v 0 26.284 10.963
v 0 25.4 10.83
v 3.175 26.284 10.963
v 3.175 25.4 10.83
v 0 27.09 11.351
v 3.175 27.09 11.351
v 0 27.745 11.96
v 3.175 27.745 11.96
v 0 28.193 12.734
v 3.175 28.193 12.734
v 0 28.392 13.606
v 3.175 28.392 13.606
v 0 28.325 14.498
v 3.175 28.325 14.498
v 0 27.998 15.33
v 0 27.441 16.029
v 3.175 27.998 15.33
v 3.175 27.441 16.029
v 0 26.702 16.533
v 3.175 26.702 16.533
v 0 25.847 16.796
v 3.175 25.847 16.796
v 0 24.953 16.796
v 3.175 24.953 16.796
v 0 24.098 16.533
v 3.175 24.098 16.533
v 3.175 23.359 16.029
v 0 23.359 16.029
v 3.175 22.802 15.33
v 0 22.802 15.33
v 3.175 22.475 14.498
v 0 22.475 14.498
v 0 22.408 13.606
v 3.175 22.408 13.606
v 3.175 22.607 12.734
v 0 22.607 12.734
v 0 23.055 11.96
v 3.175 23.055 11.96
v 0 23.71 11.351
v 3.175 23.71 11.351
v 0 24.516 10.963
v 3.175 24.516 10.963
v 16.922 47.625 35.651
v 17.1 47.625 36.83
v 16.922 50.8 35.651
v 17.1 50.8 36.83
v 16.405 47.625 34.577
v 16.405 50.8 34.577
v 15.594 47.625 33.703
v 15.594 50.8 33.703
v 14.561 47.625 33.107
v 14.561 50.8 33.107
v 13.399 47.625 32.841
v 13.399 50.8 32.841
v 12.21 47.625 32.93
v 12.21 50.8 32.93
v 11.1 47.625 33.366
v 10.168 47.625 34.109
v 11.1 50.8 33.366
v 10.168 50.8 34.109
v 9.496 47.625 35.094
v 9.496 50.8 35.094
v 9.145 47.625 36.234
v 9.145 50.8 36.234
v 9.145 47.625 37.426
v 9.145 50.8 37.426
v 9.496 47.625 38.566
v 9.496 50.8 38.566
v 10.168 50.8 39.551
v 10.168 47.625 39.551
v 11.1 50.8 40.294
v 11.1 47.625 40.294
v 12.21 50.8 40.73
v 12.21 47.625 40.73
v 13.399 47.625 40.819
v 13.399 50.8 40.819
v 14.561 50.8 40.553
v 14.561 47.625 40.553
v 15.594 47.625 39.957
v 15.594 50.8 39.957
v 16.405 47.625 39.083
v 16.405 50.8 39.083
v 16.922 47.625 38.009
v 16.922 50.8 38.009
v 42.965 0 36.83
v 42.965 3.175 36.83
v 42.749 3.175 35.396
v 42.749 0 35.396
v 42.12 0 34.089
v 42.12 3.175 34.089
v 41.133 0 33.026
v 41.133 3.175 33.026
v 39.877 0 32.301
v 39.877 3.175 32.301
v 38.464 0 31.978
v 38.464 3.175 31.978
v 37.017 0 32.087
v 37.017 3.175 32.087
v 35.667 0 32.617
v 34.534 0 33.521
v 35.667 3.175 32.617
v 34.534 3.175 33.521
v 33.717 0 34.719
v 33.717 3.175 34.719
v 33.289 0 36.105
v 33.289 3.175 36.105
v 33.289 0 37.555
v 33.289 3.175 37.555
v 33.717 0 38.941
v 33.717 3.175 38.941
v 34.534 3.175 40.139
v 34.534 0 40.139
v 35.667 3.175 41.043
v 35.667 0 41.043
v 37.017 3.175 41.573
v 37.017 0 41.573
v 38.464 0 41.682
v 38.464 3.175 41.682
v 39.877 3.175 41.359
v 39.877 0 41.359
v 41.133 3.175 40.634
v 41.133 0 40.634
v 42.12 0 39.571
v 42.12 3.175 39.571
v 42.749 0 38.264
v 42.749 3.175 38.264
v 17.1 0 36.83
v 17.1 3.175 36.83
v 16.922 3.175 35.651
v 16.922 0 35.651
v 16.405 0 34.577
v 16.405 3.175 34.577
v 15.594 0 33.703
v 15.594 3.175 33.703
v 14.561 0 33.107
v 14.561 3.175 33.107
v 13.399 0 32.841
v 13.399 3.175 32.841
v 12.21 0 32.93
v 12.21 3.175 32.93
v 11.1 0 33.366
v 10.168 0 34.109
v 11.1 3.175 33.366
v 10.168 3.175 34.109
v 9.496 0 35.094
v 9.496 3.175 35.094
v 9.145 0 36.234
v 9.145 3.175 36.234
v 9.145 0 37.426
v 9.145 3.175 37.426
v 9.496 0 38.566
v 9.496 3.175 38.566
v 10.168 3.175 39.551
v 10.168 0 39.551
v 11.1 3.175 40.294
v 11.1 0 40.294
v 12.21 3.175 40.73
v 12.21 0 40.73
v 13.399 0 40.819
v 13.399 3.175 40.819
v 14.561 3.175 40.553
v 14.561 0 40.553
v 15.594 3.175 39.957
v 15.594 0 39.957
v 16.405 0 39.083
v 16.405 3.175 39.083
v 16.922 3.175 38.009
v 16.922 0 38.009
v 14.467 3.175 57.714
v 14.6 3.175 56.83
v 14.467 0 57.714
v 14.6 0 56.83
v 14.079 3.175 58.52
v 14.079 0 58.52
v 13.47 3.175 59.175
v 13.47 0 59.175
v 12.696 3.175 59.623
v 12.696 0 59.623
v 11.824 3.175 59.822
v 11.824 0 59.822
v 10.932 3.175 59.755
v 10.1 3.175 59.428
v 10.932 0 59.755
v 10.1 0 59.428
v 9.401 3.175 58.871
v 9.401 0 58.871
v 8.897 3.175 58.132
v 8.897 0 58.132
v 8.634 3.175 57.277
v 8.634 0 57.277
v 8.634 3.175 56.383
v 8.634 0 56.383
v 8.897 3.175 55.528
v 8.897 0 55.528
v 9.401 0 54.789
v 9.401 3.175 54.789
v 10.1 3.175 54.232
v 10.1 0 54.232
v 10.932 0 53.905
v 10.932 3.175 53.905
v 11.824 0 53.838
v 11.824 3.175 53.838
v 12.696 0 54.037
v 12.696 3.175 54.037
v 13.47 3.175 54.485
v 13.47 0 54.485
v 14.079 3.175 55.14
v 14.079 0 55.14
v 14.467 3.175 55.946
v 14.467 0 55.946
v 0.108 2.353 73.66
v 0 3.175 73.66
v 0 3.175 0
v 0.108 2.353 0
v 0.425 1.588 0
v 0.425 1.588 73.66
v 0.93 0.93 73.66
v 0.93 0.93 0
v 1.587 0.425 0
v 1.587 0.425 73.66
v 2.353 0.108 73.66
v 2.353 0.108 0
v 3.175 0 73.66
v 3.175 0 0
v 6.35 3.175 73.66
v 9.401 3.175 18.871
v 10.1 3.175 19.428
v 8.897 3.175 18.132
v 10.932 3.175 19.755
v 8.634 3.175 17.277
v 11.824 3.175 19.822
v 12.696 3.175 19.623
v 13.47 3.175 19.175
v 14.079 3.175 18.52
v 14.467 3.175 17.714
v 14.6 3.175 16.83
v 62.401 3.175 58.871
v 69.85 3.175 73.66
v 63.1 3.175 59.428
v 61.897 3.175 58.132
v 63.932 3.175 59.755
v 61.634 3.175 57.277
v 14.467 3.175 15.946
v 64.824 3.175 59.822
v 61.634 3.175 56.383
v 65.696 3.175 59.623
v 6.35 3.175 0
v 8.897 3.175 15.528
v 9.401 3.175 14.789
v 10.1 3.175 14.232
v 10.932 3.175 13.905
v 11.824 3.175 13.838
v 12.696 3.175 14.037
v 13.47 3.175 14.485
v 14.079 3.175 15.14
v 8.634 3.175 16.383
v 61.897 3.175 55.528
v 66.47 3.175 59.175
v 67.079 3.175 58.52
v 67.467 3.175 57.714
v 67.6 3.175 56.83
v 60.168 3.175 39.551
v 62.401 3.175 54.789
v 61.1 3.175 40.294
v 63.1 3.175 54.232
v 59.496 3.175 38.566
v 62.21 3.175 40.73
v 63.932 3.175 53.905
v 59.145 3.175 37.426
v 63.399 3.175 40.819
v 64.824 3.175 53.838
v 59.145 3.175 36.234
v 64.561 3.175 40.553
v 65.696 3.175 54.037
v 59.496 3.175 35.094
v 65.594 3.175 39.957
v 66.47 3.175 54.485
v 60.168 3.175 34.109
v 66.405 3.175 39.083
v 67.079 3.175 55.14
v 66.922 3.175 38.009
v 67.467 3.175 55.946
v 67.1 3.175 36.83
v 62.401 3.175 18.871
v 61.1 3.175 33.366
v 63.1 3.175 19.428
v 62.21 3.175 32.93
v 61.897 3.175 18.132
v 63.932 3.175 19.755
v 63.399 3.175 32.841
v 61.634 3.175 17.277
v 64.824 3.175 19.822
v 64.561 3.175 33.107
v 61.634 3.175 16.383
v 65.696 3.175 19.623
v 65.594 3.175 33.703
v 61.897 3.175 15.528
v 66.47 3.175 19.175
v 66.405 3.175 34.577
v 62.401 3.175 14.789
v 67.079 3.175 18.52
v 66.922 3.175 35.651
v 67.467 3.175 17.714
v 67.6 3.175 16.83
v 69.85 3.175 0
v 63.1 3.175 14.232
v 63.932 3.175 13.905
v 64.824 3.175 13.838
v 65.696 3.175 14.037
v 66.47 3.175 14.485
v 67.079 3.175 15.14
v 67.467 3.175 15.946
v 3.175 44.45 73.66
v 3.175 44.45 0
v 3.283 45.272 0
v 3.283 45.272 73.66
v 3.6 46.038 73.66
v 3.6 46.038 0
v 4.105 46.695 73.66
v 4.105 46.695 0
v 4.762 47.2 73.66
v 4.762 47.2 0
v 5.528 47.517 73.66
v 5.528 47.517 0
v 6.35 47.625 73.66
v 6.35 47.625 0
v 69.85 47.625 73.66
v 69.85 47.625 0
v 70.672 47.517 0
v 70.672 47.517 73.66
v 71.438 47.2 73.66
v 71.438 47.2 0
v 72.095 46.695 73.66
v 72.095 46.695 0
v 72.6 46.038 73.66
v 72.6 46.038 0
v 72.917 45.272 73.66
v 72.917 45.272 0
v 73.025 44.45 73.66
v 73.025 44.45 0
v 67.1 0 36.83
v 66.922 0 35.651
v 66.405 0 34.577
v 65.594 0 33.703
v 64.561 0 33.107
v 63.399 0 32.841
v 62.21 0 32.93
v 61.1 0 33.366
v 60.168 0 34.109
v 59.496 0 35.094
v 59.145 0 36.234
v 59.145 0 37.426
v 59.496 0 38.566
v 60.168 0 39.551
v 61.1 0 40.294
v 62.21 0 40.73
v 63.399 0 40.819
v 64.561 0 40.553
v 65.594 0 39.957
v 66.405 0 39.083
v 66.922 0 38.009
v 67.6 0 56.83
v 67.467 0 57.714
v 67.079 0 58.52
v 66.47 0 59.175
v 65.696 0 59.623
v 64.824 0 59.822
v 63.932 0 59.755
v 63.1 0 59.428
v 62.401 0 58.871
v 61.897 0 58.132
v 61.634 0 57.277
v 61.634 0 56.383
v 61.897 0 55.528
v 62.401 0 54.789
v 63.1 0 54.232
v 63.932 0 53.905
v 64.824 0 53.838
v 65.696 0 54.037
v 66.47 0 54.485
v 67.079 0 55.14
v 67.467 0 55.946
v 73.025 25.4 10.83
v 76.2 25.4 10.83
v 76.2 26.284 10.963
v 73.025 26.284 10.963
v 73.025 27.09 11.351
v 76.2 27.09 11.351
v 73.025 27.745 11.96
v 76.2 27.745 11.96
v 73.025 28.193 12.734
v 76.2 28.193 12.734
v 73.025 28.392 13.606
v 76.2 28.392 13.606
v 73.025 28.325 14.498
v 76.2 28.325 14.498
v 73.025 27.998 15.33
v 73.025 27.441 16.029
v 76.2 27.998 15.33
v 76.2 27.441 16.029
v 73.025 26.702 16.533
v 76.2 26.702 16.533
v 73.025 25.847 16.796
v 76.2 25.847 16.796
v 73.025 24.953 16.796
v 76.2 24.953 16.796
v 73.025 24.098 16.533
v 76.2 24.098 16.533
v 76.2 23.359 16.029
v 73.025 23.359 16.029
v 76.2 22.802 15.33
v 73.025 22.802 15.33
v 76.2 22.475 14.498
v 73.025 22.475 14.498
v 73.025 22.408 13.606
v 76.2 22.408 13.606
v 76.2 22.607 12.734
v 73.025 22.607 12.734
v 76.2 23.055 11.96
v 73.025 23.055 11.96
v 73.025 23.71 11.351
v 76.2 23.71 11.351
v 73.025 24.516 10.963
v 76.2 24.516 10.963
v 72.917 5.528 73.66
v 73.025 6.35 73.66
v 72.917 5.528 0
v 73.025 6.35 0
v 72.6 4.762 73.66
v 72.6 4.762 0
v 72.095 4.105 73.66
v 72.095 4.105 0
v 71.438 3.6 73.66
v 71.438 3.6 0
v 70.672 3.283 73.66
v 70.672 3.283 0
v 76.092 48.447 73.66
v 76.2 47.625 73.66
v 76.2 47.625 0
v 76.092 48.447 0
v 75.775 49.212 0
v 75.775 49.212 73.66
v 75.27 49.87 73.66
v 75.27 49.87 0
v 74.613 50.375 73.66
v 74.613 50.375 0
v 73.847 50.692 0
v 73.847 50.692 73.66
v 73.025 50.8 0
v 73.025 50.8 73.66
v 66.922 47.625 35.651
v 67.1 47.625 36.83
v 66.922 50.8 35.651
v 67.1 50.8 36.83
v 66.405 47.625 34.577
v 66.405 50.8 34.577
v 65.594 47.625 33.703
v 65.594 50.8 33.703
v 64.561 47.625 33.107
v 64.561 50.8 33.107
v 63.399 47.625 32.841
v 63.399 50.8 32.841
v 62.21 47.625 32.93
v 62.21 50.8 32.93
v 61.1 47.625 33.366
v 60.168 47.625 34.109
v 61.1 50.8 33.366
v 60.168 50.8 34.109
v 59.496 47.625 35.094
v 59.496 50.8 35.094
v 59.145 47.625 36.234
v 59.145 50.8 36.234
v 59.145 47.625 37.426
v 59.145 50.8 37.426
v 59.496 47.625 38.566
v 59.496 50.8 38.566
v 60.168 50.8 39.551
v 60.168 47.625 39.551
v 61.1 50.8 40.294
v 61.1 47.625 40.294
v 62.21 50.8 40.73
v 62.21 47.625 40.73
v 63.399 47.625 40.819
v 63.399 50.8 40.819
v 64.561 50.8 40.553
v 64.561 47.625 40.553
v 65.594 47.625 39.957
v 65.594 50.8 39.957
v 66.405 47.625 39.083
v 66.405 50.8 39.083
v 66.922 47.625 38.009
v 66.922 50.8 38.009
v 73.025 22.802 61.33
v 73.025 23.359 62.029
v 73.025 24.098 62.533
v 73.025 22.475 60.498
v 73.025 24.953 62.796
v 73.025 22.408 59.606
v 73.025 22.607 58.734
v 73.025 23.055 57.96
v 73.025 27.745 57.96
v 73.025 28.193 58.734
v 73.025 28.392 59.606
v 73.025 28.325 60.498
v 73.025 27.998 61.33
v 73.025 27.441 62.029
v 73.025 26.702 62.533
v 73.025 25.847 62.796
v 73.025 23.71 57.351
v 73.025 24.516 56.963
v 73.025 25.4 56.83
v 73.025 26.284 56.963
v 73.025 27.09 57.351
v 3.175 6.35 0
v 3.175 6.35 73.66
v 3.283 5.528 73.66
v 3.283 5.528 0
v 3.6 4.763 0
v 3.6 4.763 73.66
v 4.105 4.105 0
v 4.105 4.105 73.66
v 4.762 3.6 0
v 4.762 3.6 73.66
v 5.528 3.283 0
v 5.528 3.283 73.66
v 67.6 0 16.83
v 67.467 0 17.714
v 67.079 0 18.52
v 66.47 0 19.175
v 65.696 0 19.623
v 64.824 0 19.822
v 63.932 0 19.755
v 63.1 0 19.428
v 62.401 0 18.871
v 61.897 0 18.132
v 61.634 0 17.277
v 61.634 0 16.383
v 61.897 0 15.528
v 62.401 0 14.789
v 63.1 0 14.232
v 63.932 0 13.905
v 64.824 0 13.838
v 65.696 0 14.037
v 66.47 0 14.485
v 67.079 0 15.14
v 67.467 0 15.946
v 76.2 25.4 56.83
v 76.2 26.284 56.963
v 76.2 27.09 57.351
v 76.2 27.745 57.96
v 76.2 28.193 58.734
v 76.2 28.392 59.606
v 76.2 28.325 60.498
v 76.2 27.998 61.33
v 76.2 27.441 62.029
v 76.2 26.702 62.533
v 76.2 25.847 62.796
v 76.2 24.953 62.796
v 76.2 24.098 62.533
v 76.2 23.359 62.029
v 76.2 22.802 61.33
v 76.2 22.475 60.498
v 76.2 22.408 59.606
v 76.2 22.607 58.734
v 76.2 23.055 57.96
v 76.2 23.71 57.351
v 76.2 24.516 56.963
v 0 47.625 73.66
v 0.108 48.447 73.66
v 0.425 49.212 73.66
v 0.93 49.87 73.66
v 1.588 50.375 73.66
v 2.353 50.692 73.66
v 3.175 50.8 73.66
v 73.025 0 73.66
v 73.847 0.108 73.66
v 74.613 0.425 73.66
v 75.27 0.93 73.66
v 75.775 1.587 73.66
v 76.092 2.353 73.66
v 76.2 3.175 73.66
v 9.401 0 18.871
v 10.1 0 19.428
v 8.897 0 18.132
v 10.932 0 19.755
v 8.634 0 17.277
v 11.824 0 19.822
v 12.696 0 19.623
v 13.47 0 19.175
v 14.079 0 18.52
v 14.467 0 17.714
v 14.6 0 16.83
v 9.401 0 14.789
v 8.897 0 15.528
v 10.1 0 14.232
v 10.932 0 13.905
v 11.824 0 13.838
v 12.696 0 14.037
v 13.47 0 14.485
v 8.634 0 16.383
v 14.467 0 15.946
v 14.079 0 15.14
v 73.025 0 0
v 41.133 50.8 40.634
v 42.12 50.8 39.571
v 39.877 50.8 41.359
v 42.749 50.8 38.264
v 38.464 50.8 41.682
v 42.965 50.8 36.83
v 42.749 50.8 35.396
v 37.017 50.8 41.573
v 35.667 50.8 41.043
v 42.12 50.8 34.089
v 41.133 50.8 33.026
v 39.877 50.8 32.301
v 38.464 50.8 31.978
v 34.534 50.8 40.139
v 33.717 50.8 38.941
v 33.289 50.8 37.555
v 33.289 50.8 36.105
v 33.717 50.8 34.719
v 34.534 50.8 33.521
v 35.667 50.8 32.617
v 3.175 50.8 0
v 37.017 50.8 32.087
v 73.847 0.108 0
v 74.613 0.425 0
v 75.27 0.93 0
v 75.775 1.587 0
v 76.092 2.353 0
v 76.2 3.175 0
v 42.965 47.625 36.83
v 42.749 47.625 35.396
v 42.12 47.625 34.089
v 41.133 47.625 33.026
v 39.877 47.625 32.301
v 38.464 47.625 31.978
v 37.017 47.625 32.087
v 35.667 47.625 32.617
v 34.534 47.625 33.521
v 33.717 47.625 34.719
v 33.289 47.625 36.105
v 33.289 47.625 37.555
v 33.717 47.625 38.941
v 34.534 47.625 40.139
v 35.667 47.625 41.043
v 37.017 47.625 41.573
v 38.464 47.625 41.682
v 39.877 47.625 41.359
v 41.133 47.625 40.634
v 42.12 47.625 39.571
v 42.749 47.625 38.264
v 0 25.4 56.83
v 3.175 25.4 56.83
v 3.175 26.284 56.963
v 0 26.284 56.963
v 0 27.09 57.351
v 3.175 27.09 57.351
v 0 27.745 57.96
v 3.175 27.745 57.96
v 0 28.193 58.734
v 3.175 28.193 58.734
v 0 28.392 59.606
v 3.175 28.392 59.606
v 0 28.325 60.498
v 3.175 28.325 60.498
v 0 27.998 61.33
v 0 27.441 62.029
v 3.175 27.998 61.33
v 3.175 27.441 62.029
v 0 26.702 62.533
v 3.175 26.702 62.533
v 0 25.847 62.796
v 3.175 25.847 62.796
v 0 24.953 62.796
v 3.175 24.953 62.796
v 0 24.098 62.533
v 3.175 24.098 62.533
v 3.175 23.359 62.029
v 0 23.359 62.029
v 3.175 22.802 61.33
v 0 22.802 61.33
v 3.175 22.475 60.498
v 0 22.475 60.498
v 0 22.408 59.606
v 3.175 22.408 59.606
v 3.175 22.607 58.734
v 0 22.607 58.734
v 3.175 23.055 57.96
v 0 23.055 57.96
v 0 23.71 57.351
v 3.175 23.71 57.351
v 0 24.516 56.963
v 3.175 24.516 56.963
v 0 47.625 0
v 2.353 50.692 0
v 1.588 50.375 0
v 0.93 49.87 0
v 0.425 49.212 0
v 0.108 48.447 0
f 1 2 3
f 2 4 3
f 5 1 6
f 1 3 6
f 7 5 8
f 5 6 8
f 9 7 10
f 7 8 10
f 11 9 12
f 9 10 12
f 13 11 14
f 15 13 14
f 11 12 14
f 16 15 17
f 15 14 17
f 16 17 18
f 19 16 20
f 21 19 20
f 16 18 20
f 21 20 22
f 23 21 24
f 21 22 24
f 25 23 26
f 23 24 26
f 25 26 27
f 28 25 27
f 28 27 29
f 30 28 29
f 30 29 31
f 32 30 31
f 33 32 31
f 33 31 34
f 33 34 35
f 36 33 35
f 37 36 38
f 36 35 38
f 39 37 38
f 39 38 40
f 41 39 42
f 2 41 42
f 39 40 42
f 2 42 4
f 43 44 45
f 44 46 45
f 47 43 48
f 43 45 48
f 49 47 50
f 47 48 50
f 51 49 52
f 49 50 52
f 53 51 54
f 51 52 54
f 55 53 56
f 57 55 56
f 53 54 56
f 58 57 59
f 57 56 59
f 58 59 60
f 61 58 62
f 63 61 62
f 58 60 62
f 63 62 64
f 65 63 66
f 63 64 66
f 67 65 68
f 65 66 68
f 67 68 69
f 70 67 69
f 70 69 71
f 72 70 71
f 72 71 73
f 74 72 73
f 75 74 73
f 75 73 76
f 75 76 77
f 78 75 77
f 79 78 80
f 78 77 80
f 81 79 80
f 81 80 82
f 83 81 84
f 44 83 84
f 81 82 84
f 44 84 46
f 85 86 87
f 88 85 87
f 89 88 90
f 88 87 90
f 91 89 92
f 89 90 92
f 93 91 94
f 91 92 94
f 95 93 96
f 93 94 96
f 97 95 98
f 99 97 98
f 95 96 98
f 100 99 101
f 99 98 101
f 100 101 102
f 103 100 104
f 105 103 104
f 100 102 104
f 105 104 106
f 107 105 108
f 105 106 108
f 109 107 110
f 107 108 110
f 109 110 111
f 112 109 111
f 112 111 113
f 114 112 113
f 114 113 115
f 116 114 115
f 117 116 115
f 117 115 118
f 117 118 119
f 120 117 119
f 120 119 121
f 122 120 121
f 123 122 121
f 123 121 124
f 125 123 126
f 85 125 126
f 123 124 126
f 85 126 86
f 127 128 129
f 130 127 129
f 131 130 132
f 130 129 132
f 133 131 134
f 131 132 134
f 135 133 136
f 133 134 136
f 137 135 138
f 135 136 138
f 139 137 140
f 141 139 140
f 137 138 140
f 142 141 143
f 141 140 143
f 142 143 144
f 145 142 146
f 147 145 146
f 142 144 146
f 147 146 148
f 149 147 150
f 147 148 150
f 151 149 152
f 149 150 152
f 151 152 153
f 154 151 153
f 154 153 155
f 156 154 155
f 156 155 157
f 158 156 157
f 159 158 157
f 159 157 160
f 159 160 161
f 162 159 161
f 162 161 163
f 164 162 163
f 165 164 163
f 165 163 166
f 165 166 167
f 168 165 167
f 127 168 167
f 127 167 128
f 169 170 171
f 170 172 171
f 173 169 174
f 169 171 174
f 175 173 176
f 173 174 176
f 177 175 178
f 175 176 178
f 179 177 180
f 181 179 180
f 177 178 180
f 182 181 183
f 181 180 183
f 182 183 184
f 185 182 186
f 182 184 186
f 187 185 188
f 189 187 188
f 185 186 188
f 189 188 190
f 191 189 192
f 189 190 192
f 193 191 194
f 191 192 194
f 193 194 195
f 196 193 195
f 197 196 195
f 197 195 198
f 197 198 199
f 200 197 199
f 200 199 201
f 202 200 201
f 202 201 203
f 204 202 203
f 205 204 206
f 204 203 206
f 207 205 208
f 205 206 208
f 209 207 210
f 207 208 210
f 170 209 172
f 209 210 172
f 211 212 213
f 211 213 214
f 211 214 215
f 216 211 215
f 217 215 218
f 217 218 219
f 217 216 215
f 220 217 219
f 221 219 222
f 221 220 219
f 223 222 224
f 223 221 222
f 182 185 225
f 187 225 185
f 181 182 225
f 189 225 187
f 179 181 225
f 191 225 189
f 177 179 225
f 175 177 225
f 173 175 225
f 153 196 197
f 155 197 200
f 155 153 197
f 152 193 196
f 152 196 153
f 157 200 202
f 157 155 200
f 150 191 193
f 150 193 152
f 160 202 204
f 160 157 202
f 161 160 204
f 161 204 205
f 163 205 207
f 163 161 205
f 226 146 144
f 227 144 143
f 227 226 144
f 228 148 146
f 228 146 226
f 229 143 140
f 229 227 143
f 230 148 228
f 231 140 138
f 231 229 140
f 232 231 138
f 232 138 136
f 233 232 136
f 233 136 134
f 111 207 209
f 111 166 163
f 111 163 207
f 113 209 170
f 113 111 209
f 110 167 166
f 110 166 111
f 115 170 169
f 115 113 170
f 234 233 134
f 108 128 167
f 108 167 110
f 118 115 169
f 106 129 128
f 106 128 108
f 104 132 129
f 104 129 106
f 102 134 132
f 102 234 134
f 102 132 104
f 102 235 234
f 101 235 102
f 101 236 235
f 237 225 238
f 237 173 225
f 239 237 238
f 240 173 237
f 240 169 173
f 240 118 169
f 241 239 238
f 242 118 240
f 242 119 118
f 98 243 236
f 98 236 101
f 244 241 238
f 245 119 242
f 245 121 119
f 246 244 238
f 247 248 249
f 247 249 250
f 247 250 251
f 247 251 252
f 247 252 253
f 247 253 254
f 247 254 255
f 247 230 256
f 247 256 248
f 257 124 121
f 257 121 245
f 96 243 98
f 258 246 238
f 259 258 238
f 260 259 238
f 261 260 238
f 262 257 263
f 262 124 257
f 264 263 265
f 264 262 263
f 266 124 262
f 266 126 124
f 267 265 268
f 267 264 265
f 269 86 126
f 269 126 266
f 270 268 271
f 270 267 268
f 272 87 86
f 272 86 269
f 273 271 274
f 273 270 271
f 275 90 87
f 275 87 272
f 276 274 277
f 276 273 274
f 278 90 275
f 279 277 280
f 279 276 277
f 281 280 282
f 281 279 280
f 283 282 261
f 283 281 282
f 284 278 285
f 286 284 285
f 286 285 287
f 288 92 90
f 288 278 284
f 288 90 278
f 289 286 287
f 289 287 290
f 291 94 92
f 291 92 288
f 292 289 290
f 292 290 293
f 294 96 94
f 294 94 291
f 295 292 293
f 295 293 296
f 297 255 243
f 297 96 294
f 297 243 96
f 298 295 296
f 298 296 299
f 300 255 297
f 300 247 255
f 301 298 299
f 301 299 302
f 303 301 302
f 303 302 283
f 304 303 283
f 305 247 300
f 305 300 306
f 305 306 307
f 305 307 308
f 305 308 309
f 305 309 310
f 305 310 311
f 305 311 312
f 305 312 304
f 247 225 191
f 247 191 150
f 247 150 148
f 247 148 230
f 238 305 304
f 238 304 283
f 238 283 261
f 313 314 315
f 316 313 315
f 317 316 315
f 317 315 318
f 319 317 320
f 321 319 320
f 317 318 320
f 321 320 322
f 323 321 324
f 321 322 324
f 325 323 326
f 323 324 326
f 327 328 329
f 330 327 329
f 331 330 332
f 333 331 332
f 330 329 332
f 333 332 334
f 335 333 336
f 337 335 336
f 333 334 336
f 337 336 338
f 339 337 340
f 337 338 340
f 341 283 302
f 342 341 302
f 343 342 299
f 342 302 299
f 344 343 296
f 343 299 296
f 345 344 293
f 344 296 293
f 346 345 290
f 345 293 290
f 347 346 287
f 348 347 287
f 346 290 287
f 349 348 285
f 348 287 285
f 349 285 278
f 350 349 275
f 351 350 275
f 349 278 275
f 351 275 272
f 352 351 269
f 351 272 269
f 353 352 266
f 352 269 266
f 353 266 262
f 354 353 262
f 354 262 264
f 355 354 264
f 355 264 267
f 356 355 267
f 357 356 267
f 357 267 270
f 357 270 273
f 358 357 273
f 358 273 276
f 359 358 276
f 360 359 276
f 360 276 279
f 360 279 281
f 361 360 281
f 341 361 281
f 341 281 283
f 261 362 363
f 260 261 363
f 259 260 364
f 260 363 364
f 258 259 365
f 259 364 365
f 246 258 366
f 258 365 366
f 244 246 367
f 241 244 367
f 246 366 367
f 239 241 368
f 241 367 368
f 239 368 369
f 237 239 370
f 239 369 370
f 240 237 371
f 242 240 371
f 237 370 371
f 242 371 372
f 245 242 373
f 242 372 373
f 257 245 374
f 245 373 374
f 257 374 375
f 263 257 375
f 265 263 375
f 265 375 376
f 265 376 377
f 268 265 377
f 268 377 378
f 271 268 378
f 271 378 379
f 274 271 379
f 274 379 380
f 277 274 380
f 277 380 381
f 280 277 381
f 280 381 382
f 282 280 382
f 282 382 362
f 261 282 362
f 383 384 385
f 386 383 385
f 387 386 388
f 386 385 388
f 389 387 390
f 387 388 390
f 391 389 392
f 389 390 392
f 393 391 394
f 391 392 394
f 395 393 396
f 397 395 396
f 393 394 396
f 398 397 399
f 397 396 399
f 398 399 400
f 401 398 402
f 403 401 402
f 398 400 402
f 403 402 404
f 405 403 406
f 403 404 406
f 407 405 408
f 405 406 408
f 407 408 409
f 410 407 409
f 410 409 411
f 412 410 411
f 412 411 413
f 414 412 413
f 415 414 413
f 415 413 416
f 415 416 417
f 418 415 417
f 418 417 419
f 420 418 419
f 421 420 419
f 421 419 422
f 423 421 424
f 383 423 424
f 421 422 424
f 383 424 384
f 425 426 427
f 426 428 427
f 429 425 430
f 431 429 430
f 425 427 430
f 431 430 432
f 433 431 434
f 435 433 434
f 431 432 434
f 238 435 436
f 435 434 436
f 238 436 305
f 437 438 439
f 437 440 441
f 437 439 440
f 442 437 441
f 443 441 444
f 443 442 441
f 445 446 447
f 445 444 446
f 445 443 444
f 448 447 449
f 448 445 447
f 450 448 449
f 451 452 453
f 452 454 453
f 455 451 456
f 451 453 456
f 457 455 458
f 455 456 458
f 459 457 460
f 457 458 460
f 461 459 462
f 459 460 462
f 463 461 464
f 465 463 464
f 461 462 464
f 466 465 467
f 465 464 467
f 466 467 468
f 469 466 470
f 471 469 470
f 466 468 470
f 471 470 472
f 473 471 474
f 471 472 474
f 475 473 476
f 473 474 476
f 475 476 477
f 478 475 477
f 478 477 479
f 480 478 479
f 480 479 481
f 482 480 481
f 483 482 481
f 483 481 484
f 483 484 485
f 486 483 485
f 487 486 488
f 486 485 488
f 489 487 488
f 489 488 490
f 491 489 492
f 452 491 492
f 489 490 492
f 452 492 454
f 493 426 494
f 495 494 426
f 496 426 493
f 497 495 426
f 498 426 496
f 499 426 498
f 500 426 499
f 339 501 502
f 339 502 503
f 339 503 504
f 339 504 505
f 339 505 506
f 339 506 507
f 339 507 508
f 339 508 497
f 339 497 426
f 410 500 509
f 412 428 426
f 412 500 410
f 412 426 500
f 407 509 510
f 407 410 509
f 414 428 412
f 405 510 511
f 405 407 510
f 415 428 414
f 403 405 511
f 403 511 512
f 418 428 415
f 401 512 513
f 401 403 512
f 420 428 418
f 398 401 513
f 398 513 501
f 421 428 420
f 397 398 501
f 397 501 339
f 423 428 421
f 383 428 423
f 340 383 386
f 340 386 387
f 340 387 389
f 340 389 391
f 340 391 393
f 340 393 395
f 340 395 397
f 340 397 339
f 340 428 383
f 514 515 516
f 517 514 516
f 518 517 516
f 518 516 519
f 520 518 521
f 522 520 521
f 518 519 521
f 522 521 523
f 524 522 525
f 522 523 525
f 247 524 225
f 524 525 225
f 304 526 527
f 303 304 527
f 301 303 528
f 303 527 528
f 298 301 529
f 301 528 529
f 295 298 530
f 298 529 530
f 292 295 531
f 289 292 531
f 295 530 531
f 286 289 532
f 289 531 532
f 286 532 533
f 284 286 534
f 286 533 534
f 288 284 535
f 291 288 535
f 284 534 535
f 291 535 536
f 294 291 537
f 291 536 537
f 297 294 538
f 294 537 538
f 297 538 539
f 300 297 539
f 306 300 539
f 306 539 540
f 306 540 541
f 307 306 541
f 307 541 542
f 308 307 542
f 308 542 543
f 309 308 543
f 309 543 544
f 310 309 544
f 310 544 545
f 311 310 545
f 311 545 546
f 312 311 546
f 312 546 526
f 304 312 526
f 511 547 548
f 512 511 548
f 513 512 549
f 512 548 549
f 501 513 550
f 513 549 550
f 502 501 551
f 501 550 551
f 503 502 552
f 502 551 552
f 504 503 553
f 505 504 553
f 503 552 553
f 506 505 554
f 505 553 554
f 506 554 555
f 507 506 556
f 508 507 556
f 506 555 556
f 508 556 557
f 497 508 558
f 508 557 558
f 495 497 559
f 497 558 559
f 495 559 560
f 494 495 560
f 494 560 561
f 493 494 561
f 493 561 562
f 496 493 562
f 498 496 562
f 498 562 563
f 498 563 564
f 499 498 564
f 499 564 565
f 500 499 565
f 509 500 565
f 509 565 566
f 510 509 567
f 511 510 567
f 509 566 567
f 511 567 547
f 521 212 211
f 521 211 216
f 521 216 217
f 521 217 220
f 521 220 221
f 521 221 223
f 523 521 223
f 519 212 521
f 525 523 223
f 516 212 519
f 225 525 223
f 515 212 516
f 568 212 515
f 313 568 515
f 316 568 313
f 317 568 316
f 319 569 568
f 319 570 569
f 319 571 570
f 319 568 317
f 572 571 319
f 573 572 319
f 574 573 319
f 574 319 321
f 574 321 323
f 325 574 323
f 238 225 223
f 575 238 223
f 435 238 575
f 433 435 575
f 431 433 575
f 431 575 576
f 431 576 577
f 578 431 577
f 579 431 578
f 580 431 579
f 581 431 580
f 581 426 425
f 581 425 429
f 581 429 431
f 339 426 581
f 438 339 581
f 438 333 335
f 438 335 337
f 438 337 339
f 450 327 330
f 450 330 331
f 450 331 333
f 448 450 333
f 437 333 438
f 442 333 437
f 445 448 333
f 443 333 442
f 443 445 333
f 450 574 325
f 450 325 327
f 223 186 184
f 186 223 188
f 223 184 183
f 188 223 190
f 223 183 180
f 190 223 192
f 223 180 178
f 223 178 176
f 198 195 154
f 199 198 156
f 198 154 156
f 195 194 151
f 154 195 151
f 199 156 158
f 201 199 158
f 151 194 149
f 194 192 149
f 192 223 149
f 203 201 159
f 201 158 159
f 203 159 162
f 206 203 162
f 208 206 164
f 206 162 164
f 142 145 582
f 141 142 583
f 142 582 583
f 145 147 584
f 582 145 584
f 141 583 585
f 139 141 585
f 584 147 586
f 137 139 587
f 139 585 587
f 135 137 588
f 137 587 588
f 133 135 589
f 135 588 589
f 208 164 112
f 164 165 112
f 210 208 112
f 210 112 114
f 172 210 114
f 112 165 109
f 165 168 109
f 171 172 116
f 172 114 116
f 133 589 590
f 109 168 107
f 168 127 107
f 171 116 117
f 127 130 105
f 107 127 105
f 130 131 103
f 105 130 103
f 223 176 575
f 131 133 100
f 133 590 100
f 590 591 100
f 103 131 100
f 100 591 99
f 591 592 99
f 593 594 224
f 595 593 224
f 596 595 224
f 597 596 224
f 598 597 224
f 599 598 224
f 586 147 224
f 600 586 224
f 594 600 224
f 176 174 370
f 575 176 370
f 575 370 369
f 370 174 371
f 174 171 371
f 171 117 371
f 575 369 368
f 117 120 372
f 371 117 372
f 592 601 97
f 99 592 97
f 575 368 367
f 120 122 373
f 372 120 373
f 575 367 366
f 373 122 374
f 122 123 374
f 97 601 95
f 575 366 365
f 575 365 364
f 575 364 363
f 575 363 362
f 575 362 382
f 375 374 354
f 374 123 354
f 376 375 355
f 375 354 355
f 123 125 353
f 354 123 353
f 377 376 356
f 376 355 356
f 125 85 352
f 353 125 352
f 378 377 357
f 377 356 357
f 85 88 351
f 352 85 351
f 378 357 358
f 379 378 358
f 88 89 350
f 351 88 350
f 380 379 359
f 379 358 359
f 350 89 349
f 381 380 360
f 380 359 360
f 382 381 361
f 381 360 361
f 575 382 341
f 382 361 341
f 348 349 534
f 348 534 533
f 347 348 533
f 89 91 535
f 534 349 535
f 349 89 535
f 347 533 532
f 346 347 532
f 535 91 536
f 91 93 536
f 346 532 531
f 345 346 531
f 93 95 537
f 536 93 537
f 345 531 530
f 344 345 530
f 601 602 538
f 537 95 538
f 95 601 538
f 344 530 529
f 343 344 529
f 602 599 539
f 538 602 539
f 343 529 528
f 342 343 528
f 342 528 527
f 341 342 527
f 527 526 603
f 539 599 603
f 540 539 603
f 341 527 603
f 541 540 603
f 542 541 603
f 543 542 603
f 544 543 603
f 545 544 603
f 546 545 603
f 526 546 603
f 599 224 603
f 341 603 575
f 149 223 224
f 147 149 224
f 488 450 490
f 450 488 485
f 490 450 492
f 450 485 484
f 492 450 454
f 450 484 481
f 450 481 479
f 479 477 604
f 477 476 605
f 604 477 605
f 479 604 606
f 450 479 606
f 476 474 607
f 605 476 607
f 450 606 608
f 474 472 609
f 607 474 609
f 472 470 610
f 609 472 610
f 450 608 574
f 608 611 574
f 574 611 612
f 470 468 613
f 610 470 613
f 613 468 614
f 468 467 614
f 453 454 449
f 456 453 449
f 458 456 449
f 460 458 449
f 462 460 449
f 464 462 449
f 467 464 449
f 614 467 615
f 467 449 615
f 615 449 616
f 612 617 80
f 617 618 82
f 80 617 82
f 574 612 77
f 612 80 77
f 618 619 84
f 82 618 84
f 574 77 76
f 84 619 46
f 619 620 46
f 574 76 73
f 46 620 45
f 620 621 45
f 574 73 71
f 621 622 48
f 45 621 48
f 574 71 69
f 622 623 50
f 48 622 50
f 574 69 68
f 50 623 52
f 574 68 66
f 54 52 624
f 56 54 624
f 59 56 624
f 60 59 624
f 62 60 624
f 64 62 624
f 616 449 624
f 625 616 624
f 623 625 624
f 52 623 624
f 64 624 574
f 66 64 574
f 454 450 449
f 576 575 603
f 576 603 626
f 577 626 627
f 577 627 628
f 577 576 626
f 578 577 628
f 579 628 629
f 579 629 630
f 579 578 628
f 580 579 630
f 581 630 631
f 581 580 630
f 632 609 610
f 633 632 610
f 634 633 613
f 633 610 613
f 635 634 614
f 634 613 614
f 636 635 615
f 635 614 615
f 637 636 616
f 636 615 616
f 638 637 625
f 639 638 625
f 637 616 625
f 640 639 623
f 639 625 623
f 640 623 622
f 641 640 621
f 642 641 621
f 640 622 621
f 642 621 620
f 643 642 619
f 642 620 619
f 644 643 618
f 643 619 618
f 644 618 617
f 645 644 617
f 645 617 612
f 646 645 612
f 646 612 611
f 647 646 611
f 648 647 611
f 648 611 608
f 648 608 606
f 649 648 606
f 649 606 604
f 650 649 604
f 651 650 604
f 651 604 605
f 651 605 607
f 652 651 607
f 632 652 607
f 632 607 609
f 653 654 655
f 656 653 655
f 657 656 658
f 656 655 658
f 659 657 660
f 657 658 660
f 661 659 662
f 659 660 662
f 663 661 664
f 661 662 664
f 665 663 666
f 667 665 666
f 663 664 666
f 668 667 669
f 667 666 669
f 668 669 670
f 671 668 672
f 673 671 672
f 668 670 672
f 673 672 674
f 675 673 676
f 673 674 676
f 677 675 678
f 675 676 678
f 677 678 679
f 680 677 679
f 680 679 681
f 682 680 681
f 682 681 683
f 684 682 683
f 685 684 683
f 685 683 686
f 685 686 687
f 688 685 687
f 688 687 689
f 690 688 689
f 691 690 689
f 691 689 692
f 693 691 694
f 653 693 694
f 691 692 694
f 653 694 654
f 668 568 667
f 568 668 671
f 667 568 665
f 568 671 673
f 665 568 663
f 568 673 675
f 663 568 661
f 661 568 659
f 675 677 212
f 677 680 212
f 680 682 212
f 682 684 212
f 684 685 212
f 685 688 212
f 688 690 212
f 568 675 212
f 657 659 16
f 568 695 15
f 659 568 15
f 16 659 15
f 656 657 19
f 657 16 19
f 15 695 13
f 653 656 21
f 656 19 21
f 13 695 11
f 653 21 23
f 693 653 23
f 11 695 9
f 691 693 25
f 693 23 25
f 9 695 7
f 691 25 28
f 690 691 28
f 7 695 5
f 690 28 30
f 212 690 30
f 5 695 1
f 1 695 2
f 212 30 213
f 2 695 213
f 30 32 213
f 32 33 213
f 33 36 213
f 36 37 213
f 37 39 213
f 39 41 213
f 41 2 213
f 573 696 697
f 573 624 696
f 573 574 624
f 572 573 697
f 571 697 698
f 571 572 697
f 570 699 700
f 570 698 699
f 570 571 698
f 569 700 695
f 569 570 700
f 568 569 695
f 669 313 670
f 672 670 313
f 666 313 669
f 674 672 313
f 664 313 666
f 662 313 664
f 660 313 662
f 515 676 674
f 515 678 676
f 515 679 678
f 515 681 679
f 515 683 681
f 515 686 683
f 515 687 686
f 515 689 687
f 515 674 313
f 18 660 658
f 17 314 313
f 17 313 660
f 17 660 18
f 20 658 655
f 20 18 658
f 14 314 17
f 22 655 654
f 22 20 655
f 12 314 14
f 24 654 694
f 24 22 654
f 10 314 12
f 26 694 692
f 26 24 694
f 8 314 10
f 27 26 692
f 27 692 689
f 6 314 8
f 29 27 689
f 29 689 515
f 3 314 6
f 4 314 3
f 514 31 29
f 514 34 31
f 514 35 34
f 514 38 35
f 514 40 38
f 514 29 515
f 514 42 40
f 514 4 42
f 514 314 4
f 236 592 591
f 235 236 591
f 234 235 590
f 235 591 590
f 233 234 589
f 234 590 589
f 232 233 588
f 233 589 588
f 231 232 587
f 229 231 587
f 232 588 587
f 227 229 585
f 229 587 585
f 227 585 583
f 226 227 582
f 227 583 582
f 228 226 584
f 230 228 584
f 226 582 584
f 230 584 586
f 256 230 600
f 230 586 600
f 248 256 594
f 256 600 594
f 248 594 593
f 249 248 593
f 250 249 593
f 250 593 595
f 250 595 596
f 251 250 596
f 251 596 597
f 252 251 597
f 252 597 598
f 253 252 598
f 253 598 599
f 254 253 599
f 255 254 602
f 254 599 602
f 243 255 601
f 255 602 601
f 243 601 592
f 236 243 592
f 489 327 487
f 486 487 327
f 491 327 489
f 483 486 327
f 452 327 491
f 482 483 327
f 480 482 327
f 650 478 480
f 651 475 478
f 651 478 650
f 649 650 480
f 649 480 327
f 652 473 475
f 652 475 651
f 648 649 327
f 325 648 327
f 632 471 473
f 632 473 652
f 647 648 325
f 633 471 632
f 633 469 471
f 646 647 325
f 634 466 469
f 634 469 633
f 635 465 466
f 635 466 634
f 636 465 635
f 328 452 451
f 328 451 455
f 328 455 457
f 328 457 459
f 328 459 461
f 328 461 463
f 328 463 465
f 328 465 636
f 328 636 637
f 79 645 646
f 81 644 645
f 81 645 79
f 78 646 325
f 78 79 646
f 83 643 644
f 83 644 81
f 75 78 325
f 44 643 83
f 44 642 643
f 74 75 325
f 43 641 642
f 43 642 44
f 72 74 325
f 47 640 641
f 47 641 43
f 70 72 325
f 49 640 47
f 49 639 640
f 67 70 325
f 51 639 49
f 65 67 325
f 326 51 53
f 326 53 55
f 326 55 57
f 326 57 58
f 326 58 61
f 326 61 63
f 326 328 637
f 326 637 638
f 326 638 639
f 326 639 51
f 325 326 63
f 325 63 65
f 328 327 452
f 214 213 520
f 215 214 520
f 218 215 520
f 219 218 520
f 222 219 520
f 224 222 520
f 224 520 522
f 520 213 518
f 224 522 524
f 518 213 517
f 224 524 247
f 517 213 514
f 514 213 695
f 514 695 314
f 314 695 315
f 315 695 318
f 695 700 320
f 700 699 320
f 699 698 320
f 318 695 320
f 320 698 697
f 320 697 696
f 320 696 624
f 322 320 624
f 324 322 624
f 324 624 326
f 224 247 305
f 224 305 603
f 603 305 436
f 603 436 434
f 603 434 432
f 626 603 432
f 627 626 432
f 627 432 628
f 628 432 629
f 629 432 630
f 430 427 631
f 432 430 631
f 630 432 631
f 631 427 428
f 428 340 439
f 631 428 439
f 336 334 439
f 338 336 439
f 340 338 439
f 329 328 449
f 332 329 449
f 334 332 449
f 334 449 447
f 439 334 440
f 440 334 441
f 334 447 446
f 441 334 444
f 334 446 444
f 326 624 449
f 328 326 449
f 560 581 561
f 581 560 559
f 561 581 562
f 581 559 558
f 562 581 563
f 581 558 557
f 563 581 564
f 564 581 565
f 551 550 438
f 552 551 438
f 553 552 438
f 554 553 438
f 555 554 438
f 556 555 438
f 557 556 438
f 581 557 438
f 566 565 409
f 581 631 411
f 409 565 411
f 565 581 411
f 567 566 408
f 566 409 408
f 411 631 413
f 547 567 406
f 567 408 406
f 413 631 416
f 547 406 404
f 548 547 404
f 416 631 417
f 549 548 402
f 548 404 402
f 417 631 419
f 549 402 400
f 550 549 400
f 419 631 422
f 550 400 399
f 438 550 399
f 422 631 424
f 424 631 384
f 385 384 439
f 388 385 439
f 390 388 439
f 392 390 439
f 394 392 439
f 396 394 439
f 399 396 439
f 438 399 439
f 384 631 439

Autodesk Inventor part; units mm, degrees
ref_plane "YZ Plane" through (0, 0, 0) normal (1, 0, 0) x (0, 1, 0)
ref_plane "XZ Plane" through (0, 0, 0) normal (0, 1, 0) x (-1, 0, 0)
ref_plane "XY Plane" through (0, 0, 0) normal (0, 0, 1) x (1, 0, 0)
sketch "Sketch1" plane through (0, 0, 0) normal (0, 0, 1) x (1, 0, 0)
  line L0 (0, 0) -> (76.2, 0)
  line L1 (76.2, 0) -> (76.2, 50.8)
  line L2 (76.2, 50.8) -> (0, 50.8)
  line L3 (0, 50.8) -> (0, 0)
  dimension "d0" = 76.2
  dimension "d1" = 50.8
extrude "Extrusion1" add sketch "Sketch1" along normal blind 73.66
shell "Shell1" thickness 3.175 removed faces 2 at (50.8, 16.9333, 0) at (50.8, 16.9333, 73.66)
sketch "Sketch2" plane through (0, 0, 0) normal (0, -1, 0) x (1, 0, 0)
  line L0 (11.6, 16.83) -> (64.6, 16.83) construction
  line L1 (64.6, 16.83) -> (64.6, 56.83) construction
  line L2 (64.6, 56.83) -> (11.6, 56.83) construction
  line L3 (11.6, 56.83) -> (11.6, 16.83) construction
  circle A0 centre (11.6, 16.83) radius 3
  circle A1 centre (11.6, 56.83) radius 3
  circle A2 centre (64.6, 56.83) radius 3
  circle A3 centre (64.6, 16.83) radius 3
  line L4 (0, 0) -> (0, 73.66) construction
  line L5 (0, 0) -> (76.2, 0) construction
  point P0 (11.6, 36.83)
  point P1 (0, 36.83)
  point P2 (38.1, 16.83)
  point P3 (38.1, 0)
  dimension "d5" = 6
  dimension "d6" = 53
  dimension "d7" = 40
extrude "Extrusion2" cut sketch "Sketch2" against normal blind 23.8125
sketch "Sketch3" plane through (0, 50.8, 0) normal (0, 1, 0) x (1, 0, 0)
  line L0 (76.2, 0) -> (0, 0) construction
  line L1 (0, 0) -> (0, -73.66) construction
  circle A0 centre (13.1, -36.83) radius 4
  circle A1 centre (63.1, -36.83) radius 4
  line L2 (63.1, -36.83) -> (13.1, -36.83) construction
  circle A2 centre (38.1, -36.83) radius 4.8652
  point P0 (38.1, 0)
  point P1 (0, -36.83)
  point P2 (38.1, 0)
  dimension "d10" = 8
  dimension "d22" = 50
extrude "Extrusion3" cut sketch "Sketch3" against normal blind 101.6
fillet "Fillet1" radius 3.175 8 edges at (0, 50.8, 36.83) (76.2, 50.8, 36.83) (0, 0, 36.83) (3.175, 3.175, 36.83) (73.025, 3.175, 36.83) (3.175, 47.625, 36.83) (73.025, 47.625, 36.83) (76.2, 0, 36.83)
sketch "Sketch4" plane through (3.175, 50.8, 0) normal (0, 1, 0) x (1, 0, 0)
  circle A0 centre (8.425, -18.1) radius 4
  circle A1 centre (8.425, -58.1) radius 4
  circle A2 centre (61.425, -18.1) radius 4
  circle A3 centre (61.425, -58.1) radius 4
  circle A4 centre (8.425, -18.1) radius 3 construction
  circle A5 centre (61.425, -18.1) radius 3 construction
  circle A6 centre (8.425, -58.1) radius 3 construction
  circle A7 centre (61.425, -58.1) radius 3 construction
  point P0 (-3.175, 0)
  dimension "d14" = 8
extrude "Extrusion4" [suppressed]
sketch "Sketch5" plane through (76.2, 3.175, 0) normal (1, 0, 0) x (0, 0, -1)
  circle A0 centre (-59.83, 22.225) radius 3
  circle A1 centre (-13.83, 22.225) radius 3
  line L0 (-59.83, 22.225) -> (-13.83, 22.225) construction
  line L1 (-40.83, 47.625) -> (-32.83, 47.625) construction
  line L2 (0, 47.625) -> (-73.66, 47.625) construction
  line L3 (-73.66, 47.625) -> (0, 47.625) construction
  line L4 (0, 0) -> (0, 44.45) construction
  point P0 (0, -3.175)
  point P1 (-62.1, 47.625)
  point P2 (-54.1, 47.625)
  point P3 (-22.1, 47.625)
  point P4 (-14.1, 47.625)
  point P5 (-62.1, 47.625)
  point P6 (-54.1, 47.625)
  point P7 (-22.1, 47.625)
  point P8 (-14.1, 47.625)
  point P9 (-36.83, 47.625)
  point P10 (-36.83, 22.225)
  point P11 (0, 22.225)
  dimension "d17" = 6
  dimension "d18" = 46
extrude "Extrusion5" cut sketch "Sketch5" against normal through all
properties part number "2x3_Tube"
